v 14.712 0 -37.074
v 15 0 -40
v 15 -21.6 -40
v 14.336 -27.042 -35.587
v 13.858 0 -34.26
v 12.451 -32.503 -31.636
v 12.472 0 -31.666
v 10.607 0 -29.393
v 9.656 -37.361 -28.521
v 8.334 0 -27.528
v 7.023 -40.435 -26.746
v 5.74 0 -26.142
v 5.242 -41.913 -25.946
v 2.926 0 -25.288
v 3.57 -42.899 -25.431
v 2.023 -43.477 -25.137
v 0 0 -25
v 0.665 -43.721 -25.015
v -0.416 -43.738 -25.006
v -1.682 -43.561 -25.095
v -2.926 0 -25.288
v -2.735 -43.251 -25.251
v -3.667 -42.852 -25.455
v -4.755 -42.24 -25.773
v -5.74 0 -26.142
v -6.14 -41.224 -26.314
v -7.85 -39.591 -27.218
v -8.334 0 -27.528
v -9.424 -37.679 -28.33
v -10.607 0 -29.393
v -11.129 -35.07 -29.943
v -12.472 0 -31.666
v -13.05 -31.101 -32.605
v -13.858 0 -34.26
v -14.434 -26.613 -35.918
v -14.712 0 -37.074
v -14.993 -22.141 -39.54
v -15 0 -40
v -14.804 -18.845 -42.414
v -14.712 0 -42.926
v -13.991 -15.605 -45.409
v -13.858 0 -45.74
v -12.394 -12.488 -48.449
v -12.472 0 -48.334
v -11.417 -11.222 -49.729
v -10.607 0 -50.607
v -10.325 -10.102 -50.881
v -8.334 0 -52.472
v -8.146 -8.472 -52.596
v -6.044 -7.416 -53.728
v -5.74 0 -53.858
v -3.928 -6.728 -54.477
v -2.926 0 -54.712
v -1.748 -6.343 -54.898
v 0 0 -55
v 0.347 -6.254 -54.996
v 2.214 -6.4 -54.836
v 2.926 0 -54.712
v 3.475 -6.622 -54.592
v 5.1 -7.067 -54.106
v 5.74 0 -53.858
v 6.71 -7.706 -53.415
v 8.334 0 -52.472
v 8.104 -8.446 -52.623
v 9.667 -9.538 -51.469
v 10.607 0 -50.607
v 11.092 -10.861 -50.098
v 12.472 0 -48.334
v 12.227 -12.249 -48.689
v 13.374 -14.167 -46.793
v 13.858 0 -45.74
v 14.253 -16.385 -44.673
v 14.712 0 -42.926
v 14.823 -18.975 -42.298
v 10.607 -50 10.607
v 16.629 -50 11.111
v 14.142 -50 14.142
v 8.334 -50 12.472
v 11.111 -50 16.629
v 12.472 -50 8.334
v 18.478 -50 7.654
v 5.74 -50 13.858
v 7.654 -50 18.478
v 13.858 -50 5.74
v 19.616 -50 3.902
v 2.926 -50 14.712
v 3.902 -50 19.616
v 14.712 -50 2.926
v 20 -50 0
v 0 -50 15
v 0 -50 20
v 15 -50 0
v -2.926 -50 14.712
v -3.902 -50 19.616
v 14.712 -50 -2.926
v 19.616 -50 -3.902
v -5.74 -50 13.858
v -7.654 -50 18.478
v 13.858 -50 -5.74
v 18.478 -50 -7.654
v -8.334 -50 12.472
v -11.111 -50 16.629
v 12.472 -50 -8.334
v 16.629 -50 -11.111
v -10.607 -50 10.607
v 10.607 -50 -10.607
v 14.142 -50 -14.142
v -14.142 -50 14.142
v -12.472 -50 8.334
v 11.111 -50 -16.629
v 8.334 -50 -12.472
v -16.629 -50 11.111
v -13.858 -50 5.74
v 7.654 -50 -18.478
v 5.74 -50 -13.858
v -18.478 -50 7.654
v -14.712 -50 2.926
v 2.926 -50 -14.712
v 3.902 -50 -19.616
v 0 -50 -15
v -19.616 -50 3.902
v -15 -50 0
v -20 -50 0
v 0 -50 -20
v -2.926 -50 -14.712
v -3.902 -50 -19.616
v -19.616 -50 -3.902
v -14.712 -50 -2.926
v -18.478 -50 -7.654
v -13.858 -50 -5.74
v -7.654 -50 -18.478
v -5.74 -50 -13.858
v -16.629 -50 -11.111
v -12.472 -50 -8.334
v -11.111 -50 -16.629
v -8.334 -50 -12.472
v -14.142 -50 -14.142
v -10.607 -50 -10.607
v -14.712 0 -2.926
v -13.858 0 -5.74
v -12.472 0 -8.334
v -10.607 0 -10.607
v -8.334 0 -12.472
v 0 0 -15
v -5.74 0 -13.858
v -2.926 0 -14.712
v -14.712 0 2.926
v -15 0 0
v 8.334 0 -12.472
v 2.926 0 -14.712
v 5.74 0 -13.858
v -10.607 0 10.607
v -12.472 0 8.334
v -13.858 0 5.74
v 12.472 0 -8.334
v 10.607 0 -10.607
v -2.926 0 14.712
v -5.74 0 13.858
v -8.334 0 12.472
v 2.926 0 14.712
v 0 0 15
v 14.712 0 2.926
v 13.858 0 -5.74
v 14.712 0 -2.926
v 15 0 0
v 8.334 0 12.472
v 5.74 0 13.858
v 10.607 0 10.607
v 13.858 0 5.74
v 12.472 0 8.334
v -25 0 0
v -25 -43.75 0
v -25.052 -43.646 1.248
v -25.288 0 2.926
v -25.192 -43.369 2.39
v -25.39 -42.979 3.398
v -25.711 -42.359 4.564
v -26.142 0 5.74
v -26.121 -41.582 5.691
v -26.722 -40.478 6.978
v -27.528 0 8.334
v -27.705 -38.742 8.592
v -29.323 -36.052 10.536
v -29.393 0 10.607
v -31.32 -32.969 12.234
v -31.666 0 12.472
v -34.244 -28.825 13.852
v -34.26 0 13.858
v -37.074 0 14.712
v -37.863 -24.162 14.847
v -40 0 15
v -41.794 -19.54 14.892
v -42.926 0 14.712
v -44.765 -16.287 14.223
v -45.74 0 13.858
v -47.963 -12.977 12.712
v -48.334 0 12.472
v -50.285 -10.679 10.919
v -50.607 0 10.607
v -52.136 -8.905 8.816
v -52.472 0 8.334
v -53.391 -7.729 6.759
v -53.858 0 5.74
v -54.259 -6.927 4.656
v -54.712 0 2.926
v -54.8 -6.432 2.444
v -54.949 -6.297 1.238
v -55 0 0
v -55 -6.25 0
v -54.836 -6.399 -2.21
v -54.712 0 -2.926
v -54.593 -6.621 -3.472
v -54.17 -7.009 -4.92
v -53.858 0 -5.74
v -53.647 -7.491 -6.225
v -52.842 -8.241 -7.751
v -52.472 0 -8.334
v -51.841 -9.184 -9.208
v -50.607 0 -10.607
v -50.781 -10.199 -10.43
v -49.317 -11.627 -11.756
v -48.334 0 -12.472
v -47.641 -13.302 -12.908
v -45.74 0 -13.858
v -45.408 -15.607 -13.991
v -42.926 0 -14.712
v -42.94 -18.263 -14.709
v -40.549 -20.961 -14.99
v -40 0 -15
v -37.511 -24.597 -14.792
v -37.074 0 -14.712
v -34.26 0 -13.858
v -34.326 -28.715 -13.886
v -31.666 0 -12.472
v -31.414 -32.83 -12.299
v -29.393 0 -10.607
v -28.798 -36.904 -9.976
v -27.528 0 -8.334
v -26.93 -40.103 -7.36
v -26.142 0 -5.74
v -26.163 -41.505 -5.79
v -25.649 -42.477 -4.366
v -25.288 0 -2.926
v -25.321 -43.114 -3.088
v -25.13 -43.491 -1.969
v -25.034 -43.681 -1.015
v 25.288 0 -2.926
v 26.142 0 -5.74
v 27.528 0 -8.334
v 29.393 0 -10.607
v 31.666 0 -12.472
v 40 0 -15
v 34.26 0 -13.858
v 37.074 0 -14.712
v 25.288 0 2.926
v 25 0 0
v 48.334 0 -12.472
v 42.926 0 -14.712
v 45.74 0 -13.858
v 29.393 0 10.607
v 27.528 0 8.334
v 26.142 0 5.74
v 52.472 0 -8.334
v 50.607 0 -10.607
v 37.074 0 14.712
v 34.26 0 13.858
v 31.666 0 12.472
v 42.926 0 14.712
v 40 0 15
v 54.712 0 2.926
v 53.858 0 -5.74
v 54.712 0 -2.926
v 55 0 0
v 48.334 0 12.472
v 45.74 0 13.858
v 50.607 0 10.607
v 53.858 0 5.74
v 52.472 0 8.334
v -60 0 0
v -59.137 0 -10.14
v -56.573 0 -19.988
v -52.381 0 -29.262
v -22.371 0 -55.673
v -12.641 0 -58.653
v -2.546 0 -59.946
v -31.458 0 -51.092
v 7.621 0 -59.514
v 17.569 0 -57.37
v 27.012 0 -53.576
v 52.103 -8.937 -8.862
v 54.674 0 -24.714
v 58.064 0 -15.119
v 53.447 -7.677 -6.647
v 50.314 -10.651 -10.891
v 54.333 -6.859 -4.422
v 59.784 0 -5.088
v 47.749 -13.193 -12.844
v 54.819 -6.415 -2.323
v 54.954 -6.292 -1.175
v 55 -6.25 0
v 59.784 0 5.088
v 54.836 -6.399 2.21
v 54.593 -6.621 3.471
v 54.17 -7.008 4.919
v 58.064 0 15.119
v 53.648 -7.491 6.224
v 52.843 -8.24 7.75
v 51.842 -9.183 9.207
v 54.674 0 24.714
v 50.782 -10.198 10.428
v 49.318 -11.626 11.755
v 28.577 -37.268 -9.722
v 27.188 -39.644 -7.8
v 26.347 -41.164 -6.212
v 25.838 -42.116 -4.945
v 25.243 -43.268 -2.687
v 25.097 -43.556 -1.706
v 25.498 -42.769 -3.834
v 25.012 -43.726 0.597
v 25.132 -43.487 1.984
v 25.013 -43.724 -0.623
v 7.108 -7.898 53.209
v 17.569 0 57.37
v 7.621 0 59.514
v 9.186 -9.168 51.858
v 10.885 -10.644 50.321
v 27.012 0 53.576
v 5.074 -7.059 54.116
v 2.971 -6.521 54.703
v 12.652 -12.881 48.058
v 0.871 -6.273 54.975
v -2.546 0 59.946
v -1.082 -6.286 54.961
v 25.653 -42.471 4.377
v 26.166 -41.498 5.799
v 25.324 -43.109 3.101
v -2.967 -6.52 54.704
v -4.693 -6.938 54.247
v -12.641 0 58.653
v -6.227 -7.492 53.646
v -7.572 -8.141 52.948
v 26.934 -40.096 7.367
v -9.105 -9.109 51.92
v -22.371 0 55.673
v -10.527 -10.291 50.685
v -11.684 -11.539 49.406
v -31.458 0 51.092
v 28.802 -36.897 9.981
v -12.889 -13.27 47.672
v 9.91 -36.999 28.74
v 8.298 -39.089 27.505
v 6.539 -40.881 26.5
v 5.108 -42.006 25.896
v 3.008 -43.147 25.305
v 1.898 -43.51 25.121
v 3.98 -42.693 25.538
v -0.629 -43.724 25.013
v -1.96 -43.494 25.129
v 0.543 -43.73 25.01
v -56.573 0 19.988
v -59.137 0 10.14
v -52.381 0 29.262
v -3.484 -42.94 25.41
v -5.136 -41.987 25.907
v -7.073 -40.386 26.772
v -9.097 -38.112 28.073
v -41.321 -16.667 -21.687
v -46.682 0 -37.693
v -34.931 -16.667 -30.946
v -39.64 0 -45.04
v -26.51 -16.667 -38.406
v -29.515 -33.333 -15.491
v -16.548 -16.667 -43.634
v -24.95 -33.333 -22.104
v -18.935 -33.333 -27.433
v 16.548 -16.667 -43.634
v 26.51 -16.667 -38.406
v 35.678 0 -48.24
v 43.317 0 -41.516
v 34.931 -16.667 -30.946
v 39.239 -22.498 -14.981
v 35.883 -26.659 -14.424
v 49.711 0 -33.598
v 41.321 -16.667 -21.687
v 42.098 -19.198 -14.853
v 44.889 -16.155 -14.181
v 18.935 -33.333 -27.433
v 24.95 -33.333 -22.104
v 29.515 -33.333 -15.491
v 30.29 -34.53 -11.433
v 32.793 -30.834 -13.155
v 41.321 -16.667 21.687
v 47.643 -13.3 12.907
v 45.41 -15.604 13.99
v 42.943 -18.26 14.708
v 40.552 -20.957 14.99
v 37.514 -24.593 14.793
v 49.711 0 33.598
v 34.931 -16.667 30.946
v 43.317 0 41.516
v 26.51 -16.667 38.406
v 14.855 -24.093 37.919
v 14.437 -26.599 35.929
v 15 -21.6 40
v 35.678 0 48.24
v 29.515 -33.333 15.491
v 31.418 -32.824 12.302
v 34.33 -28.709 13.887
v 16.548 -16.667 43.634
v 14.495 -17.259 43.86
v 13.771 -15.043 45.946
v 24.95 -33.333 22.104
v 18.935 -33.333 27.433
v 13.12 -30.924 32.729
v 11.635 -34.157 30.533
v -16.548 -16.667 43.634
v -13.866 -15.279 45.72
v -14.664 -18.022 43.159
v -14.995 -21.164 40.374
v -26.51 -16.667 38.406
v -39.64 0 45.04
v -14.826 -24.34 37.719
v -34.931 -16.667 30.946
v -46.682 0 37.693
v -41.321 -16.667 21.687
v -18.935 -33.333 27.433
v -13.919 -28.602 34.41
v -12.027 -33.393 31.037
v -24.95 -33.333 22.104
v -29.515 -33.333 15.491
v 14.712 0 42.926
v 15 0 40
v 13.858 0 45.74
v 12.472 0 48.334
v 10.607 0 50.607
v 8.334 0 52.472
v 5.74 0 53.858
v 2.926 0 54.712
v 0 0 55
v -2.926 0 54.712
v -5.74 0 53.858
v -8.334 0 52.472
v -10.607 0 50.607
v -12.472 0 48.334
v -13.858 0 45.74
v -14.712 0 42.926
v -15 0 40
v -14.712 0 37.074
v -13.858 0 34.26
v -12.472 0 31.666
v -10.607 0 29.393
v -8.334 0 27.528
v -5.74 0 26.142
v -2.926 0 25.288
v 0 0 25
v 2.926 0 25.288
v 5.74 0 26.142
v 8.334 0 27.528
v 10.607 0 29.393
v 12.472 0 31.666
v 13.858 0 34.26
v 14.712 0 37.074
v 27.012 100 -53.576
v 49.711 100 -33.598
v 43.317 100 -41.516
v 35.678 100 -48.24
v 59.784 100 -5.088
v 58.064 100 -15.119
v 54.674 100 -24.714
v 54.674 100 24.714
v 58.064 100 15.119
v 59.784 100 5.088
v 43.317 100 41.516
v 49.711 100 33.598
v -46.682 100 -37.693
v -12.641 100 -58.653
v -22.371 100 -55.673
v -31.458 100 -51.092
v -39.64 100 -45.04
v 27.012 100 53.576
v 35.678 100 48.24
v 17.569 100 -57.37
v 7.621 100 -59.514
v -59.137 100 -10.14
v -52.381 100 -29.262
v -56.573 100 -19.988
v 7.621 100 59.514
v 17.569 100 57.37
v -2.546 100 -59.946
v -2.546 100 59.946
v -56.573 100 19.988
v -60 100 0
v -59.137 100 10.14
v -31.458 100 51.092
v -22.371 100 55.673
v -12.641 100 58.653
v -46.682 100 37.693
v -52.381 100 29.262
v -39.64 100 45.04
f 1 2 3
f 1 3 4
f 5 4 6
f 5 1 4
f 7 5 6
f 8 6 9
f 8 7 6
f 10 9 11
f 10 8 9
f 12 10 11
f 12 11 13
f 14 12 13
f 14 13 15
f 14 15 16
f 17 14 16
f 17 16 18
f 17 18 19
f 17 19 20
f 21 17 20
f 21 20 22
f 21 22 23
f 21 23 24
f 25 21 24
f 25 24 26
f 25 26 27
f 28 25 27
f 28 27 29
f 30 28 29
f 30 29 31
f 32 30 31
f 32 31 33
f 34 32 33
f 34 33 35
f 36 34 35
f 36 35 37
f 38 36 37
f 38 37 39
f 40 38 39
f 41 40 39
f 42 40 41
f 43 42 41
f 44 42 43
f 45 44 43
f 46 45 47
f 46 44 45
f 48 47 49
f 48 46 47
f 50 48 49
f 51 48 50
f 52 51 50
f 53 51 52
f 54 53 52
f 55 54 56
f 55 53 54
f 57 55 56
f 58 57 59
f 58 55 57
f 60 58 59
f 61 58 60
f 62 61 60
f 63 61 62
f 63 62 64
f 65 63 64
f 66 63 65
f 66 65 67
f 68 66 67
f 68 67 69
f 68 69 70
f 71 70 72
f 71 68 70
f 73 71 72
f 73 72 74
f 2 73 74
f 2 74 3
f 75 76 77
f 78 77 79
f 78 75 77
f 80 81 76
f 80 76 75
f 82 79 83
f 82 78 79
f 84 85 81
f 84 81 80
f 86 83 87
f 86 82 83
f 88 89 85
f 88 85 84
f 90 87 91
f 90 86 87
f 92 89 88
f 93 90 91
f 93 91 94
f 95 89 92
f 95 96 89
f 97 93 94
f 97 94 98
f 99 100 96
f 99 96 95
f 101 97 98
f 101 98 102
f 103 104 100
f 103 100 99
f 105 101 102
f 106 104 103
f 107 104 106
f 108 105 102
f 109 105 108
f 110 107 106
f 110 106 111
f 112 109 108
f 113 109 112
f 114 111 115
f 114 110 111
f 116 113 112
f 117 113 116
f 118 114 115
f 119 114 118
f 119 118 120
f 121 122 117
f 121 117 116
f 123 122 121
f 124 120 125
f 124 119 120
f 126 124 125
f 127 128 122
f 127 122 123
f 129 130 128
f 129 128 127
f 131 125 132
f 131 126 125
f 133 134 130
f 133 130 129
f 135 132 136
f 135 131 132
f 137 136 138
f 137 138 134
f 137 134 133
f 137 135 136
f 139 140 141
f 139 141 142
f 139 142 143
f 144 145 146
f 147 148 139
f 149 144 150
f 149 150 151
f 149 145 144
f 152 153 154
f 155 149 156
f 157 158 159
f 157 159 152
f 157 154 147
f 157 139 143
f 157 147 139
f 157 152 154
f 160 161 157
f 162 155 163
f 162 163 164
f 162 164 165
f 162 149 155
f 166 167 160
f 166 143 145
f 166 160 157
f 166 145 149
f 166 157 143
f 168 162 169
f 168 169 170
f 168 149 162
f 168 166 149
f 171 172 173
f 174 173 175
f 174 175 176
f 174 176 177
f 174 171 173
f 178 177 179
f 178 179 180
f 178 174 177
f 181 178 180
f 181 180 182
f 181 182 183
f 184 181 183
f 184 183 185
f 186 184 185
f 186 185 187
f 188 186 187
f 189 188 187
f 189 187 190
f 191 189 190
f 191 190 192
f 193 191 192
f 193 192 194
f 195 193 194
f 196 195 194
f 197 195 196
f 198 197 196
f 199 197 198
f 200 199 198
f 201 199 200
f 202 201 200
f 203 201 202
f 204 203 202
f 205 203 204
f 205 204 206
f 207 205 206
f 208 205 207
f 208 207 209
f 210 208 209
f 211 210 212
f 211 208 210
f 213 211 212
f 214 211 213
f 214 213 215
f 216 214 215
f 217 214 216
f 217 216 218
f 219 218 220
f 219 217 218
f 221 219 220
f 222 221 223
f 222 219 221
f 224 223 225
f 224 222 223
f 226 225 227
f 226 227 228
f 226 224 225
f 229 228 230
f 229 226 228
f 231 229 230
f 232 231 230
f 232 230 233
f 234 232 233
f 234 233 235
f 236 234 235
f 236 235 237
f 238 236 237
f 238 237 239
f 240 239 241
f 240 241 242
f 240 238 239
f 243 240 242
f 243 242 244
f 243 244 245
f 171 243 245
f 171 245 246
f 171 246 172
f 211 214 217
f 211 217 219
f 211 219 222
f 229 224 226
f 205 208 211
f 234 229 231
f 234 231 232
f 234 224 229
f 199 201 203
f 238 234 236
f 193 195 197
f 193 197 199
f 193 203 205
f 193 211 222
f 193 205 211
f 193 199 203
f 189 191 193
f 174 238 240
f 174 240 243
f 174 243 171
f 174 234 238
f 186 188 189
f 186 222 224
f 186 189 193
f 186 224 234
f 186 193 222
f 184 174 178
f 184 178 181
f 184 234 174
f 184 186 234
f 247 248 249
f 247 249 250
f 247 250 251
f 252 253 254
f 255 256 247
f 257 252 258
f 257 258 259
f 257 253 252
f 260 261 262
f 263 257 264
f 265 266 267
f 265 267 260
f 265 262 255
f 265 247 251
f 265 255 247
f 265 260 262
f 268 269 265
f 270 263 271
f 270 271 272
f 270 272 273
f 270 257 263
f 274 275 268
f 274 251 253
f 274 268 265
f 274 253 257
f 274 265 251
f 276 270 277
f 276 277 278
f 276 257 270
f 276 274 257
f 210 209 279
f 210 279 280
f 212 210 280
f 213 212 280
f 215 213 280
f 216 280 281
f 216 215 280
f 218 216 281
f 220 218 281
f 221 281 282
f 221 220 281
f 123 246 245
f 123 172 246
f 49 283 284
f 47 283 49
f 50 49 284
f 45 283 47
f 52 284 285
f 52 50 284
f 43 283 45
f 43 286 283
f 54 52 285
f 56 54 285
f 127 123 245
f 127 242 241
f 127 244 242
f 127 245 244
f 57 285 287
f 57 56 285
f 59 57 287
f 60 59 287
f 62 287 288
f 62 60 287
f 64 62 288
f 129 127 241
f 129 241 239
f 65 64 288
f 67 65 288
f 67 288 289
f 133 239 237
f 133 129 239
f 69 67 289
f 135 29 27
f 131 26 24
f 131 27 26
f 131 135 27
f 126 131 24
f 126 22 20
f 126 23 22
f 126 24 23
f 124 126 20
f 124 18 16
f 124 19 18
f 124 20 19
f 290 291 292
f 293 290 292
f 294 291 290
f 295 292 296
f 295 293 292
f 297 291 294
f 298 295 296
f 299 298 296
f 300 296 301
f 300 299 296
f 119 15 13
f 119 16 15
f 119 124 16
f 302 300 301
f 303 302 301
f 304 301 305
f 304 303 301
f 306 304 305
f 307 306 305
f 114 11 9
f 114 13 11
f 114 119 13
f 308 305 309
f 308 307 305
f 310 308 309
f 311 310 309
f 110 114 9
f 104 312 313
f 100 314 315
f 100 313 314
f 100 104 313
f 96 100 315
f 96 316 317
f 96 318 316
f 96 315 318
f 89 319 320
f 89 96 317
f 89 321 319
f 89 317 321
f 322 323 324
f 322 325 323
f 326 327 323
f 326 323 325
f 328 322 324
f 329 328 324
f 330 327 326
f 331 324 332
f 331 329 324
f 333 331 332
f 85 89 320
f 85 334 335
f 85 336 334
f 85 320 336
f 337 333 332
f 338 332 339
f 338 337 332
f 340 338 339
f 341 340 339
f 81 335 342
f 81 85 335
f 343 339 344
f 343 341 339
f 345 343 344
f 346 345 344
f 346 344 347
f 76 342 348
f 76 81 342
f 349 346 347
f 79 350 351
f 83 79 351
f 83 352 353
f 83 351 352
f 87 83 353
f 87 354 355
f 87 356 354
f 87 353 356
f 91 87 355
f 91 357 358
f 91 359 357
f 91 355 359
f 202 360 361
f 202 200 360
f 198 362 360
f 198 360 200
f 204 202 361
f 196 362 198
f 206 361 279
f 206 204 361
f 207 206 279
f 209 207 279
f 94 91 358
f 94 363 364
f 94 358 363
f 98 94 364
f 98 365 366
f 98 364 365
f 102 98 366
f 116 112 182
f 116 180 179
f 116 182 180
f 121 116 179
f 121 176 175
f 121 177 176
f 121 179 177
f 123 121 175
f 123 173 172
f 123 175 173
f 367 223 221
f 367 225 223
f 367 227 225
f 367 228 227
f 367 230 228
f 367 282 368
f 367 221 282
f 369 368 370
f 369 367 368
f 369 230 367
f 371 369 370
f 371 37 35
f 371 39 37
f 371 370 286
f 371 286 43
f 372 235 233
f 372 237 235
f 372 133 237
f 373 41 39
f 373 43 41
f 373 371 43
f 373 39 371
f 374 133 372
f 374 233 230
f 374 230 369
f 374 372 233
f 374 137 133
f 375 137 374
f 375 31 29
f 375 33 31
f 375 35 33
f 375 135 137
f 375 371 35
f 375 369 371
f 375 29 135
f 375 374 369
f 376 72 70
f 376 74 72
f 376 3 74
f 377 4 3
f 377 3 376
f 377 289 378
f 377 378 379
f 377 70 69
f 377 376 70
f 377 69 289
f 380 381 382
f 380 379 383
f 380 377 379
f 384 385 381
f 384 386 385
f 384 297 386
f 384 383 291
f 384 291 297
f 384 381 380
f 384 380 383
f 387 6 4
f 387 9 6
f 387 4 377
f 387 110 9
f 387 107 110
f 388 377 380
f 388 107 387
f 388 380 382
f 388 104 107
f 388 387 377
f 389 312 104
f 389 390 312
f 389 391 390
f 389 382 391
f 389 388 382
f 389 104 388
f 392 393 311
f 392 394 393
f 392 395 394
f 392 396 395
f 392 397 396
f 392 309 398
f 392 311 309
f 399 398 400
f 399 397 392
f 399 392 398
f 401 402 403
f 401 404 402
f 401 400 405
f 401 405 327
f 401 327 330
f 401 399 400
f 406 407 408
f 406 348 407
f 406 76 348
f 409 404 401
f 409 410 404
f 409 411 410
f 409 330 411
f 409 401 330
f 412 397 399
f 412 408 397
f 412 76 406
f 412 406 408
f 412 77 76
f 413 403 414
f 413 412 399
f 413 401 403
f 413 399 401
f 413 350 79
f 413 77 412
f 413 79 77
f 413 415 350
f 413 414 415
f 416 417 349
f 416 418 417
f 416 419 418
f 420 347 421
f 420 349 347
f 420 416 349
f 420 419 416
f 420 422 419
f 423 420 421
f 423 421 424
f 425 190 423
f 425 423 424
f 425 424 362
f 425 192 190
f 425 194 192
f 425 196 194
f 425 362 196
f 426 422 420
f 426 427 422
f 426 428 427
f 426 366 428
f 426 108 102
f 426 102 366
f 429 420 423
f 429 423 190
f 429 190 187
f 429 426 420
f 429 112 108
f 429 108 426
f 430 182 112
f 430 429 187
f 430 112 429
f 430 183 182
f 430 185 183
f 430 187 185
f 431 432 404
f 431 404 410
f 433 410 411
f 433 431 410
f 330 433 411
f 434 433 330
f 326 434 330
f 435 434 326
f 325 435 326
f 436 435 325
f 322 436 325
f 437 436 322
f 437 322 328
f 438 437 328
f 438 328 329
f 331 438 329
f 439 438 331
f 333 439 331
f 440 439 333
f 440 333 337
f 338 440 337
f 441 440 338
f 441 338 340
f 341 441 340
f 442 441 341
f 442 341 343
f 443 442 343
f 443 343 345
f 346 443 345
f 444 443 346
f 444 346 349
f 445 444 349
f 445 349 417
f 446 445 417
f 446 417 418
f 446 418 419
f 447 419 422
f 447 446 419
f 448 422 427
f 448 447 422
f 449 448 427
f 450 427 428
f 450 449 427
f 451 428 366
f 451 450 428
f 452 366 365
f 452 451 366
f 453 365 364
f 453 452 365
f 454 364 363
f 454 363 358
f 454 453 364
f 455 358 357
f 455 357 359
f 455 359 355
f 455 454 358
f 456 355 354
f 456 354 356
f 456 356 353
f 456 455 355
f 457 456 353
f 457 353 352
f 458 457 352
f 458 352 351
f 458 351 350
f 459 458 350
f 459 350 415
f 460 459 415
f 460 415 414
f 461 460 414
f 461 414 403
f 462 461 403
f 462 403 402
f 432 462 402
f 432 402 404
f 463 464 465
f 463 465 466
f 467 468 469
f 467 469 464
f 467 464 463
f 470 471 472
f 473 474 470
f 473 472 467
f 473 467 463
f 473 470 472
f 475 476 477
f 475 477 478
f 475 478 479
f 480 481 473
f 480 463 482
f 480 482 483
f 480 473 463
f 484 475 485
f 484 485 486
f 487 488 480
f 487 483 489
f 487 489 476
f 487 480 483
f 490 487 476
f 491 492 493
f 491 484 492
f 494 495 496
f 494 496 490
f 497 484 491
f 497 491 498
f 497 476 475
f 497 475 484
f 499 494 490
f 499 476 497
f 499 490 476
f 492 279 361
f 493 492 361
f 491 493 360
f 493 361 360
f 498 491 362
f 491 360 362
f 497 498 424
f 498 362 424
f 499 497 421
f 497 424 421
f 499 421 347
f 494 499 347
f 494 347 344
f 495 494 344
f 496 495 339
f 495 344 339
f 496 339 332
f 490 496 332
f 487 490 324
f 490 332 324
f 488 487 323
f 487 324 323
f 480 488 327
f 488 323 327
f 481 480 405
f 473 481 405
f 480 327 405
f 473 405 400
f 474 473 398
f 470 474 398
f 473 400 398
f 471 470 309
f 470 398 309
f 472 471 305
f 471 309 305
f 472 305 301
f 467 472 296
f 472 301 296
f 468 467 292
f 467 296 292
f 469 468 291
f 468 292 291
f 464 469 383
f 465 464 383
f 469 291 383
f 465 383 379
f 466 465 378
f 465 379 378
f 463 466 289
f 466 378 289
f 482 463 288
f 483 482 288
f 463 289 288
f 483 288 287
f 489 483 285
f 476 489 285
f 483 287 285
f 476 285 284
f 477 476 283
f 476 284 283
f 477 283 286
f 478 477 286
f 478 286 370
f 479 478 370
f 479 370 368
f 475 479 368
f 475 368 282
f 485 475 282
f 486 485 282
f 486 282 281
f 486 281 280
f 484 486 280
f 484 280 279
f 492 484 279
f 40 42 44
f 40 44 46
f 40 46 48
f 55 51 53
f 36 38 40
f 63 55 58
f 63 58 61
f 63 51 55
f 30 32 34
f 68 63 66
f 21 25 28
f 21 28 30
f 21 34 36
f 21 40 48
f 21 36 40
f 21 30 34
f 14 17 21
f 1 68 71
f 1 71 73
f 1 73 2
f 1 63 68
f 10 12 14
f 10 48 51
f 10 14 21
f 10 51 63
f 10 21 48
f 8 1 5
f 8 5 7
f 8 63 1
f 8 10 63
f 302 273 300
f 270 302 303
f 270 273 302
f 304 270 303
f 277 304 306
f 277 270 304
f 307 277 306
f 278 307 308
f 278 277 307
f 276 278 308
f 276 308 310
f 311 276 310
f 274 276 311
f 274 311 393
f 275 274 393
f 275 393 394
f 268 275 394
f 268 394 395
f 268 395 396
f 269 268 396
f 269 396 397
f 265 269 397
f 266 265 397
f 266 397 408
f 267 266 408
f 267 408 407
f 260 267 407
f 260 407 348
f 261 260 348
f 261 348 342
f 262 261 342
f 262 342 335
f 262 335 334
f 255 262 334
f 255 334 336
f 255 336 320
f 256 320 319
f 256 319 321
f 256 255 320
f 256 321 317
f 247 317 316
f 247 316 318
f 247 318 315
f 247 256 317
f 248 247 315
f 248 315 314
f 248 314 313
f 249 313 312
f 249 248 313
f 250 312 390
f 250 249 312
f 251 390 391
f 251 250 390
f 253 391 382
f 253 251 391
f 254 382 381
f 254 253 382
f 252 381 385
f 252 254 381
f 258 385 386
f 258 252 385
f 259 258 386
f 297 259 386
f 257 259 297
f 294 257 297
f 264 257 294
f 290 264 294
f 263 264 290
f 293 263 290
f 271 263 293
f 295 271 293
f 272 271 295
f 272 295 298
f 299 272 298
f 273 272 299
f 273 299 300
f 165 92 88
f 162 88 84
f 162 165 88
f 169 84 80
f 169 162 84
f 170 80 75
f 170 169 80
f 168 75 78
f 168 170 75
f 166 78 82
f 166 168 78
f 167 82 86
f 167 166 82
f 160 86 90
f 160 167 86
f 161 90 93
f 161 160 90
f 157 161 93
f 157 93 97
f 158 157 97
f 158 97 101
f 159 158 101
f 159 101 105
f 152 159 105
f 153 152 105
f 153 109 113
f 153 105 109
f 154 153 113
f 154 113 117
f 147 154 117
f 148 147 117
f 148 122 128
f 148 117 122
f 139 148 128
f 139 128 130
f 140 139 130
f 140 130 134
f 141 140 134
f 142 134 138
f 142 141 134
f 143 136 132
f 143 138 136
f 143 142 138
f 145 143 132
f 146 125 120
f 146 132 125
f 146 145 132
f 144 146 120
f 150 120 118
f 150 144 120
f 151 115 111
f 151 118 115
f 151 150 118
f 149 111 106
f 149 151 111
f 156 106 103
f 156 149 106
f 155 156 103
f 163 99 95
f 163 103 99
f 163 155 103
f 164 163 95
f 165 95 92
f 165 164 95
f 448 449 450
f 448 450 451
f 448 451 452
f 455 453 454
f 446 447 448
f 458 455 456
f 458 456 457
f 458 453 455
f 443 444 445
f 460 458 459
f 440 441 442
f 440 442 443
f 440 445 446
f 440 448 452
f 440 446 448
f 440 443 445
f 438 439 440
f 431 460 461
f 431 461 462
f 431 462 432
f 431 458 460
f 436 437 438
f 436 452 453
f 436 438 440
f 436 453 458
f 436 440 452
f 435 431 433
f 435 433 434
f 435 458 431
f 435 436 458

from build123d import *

# Parameters (mm, degrees)
F0_FACE_R = 60
F4_DEPTH  = 100
F1_R      = 15
F2_DEPTH  = 50.001


with BuildPart() as f0:
    # F3 (on Top) → F0 (revolve)
    with BuildSketch(Plane.XY):
        Polygon((0, 0), (-60, 0), (-20, -50), (0, -50), align=None)
    revolve(axis=Axis((0, -25, 0), (0, -1, 0)))

    # F0_face (on face) → F4 (join)
    with BuildSketch(Plane(origin=(0, 0, 0), x_dir=(-1, 0, 0), z_dir=(0, 1, 0))):
        Circle(F0_FACE_R)
    extrude(amount=F4_DEPTH)

    # F1 (on Front) → F2 (cut, through all)
    with BuildSketch(Plane.XZ):
        Circle(F1_R)
        with Locations((0, 40)):
            Circle(F1_R)
        with Locations((0, -40)):
            Circle(F1_R)
        with Locations((40, 0)):
            Circle(F1_R)
        with Locations((-40, 0)):
            Circle(F1_R)
    extrude(amount=F2_DEPTH, mode=Mode.SUBTRACT)


solid = f0.part
